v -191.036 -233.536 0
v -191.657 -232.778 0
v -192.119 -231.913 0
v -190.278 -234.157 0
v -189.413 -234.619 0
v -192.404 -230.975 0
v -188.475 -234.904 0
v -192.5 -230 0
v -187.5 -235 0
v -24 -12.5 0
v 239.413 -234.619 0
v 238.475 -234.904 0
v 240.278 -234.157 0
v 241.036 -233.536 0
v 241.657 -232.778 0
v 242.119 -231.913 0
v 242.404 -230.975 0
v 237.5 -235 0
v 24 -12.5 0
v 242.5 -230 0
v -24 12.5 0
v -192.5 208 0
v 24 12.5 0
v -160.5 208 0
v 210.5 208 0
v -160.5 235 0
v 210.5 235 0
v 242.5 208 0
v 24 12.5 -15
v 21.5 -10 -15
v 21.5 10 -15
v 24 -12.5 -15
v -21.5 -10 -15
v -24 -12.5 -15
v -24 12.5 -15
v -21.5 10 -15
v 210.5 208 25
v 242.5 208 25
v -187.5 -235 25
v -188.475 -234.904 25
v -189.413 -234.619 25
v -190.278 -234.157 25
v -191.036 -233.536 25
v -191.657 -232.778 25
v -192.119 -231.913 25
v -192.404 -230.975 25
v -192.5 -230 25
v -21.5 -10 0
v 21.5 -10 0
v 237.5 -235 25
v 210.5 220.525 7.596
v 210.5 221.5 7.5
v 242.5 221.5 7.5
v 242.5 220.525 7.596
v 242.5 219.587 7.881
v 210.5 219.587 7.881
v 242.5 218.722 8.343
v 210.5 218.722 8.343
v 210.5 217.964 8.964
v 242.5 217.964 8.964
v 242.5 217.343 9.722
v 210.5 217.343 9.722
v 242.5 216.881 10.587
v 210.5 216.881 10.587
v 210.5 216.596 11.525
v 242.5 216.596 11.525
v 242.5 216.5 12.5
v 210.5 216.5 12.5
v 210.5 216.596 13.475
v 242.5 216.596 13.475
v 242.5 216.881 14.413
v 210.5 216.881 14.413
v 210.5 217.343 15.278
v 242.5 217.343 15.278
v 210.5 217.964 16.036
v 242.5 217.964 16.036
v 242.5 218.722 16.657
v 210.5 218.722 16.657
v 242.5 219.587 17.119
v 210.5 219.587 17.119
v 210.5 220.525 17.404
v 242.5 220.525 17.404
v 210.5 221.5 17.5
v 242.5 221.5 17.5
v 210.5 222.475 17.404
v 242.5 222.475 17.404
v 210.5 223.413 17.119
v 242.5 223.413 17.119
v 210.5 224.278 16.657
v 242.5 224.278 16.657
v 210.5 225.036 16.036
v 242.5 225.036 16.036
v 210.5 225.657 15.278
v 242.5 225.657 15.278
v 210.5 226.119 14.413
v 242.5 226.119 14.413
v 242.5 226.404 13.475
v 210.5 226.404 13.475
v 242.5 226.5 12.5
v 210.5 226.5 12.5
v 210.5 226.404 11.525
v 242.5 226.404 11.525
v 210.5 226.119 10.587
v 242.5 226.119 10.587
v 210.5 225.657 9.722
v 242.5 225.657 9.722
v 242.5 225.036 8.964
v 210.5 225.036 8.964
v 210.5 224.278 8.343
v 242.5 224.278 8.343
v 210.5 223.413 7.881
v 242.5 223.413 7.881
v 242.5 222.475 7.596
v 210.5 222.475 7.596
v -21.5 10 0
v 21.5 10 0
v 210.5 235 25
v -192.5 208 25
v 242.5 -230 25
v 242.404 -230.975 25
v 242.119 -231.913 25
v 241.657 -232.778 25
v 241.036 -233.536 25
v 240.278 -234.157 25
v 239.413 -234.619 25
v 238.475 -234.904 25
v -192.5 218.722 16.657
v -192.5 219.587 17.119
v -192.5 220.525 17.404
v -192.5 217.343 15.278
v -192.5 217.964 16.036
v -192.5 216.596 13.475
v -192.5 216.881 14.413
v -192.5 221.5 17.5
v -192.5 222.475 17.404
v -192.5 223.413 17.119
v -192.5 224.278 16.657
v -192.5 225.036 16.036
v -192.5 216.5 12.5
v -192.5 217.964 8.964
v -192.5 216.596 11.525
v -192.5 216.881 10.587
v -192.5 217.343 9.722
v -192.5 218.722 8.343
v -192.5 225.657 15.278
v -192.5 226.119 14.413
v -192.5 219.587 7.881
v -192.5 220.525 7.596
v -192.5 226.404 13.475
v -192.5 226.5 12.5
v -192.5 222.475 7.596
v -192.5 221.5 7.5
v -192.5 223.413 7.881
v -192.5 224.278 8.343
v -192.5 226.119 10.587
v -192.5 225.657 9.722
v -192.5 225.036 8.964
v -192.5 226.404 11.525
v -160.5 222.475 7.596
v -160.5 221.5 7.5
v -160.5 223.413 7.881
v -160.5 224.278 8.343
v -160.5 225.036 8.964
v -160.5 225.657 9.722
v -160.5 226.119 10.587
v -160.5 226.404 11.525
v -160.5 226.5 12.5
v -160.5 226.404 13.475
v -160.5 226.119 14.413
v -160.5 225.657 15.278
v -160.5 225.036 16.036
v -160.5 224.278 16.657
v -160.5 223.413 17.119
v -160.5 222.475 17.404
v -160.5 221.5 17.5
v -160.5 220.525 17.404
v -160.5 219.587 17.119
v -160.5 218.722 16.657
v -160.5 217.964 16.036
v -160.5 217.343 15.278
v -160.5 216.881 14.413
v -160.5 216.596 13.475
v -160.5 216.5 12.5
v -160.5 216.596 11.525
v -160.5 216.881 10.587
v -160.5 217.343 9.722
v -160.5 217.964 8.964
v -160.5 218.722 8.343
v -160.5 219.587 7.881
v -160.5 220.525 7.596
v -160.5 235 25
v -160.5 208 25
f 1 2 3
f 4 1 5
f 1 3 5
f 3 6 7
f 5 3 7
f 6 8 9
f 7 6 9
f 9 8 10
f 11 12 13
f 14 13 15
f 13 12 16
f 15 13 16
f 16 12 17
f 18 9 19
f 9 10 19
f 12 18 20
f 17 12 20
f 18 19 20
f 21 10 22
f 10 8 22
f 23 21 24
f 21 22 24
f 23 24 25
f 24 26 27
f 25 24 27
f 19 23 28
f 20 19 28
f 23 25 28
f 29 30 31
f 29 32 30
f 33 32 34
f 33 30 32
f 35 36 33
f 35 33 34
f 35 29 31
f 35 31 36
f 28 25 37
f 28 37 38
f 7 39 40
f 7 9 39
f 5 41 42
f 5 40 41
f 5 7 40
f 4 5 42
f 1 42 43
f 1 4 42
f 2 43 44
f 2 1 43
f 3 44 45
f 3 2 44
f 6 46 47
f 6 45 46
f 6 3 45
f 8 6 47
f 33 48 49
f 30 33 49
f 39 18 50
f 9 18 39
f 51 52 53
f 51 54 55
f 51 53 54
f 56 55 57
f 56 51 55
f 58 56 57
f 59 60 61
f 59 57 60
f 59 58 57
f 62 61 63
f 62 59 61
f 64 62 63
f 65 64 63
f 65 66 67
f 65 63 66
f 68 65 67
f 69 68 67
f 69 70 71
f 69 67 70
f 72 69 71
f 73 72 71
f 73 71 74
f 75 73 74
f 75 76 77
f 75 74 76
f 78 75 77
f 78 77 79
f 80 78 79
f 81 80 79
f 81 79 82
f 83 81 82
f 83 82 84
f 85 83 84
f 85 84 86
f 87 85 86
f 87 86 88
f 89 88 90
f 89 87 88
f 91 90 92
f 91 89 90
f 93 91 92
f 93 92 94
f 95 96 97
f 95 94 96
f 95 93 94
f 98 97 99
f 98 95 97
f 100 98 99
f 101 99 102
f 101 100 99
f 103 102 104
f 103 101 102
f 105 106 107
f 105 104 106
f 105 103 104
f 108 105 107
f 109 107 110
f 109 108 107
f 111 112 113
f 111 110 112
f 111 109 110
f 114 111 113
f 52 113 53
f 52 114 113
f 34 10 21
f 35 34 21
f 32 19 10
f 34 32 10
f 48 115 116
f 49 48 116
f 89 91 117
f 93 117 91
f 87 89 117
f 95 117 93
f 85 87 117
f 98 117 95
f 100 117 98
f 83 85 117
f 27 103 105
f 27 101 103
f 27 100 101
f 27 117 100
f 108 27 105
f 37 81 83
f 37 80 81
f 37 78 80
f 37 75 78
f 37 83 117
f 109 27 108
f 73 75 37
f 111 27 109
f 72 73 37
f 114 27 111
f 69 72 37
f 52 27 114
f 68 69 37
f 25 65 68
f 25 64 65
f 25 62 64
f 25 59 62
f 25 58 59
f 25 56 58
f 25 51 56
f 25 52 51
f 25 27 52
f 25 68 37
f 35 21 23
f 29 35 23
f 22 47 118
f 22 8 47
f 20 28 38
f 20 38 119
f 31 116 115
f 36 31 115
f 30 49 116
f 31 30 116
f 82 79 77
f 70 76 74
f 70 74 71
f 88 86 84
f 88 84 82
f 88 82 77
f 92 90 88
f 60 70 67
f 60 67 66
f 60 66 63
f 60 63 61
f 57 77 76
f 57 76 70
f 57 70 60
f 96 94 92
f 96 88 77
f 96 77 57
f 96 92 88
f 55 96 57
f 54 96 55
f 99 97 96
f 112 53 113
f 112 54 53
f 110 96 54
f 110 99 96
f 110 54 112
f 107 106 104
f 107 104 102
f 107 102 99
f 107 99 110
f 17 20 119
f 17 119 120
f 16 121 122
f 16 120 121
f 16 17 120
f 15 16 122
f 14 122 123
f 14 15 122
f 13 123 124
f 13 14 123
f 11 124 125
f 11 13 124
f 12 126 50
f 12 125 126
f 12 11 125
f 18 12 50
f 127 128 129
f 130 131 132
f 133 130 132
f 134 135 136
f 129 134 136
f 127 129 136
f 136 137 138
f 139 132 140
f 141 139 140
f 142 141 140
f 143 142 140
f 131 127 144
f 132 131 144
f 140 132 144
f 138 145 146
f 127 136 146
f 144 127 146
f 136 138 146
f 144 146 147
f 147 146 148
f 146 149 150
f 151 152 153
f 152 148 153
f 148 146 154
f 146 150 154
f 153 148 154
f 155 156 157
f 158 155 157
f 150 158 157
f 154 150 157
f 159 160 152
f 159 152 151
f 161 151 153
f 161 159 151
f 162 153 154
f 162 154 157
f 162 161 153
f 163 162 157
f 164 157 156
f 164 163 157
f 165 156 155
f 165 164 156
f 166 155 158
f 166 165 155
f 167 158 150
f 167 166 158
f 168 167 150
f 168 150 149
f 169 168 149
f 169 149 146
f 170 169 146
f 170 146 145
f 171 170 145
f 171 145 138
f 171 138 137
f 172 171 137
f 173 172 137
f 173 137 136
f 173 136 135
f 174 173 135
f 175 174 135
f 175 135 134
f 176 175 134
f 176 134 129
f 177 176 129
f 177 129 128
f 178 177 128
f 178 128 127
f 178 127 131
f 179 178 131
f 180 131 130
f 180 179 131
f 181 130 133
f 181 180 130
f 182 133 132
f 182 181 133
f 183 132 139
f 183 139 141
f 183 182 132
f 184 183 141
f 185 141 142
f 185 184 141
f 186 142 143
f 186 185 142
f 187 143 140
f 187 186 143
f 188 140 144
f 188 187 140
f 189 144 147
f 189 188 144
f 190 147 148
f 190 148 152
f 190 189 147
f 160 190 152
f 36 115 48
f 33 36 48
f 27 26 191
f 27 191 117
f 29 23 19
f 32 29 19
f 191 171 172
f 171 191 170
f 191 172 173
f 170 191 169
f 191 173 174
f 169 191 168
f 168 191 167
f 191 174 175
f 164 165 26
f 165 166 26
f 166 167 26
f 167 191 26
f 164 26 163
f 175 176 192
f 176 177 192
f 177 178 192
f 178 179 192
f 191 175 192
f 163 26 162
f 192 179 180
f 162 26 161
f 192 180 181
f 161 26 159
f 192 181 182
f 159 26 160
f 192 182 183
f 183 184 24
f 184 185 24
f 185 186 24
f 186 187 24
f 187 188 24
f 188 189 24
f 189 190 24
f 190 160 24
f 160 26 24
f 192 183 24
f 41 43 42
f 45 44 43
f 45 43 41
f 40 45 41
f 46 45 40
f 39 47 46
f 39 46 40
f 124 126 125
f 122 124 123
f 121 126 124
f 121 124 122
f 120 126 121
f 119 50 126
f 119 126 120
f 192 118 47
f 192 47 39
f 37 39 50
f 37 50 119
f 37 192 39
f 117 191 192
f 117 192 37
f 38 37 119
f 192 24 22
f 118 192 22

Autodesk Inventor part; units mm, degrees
ref_plane "YZ Plane" through (0, 0, 0) normal (1, 0, 0) x (0, 1, 0)
ref_plane "XZ Plane" through (0, 0, 0) normal (0, 1, 0) x (-1, 0, 0)
ref_plane "XY Plane" through (0, 0, 0) normal (0, 0, 1) x (1, 0, 0)
sketch "Boceto1" plane through (0, 0, 0) normal (0, 0, 1) x (1, 0, 0)
  line L0 (-160.5, 235) -> (210.5, 235)
  line L1 (242.5, 208) -> (242.5, -230)
  line L2 (237.5, -235) -> (-187.5, -235)
  line L3 (-192.5, -230) -> (-192.5, 208)
  line L4 (-160.5, 235) -> (-160.5, 208)
  line L5 (-160.5, 208) -> (-192.5, 208)
  line L6 (210.5, 235) -> (210.5, 208)
  line L7 (210.5, 208) -> (242.5, 208)
  arc A0 (-192.5, -230) -> (-187.5, -235) centre (-187.5, -230) ccw
  arc A1 (237.5, -235) -> (242.5, -230) centre (237.5, -230) ccw
  point P0 (0, 0)
  point P1 (242.5, -235)
  point P2 (-192.5, -235)
  dimension "d0" = 435
  dimension "d2" = 32
  dimension "d3" = 27
  dimension "d4" = 32
  dimension "d18" = 5
extrude "Extrusión1" add sketch "Boceto1" along normal blind 25
sketch "Boceto2" plane through (210.5, 208, 0) normal (1, 0, 0) x (0, 0, -1)
  line L0 (0, 0) -> (-25, 0) projected
  circle A0 centre (-12.5, 13.5) radius 5
  point P0 (0, -208)
  dimension "d7" = 10
extrude "Extrusión2" add sketch "Boceto2" along normal blind 32 and the other way blind 403
sketch "Boceto3" plane through (0, 0, 0) normal (0, 0, -1) x (-1, 0, 0)
  line L0 (-21.5, 10) -> (21.5, 10)
  line L1 (21.5, 10) -> (21.5, -10)
  line L2 (21.5, -10) -> (-21.5, -10)
  line L3 (-21.5, -10) -> (-21.5, 10)
  line L4 (-21.5, 10) -> (21.5, -10) construction
  line L5 (21.5, 10) -> (-21.5, -10) construction
  line L6 (24, 12.5) -> (-24, 12.5)
  line L7 (-24, 12.5) -> (-24, -12.5)
  line L8 (-24, -12.5) -> (24, -12.5)
  line L9 (24, -12.5) -> (24, 12.5)
  line L10 (24, 12.5) -> (-24, -12.5) construction
  line L11 (-24, 12.5) -> (24, -12.5) construction
  point P0 (0, 0)
  dimension "d14" = 48
  dimension "d15" = 25
extrude "Extrusión3" add sketch "Boceto3" along normal blind 15
properties part number "tapa"
